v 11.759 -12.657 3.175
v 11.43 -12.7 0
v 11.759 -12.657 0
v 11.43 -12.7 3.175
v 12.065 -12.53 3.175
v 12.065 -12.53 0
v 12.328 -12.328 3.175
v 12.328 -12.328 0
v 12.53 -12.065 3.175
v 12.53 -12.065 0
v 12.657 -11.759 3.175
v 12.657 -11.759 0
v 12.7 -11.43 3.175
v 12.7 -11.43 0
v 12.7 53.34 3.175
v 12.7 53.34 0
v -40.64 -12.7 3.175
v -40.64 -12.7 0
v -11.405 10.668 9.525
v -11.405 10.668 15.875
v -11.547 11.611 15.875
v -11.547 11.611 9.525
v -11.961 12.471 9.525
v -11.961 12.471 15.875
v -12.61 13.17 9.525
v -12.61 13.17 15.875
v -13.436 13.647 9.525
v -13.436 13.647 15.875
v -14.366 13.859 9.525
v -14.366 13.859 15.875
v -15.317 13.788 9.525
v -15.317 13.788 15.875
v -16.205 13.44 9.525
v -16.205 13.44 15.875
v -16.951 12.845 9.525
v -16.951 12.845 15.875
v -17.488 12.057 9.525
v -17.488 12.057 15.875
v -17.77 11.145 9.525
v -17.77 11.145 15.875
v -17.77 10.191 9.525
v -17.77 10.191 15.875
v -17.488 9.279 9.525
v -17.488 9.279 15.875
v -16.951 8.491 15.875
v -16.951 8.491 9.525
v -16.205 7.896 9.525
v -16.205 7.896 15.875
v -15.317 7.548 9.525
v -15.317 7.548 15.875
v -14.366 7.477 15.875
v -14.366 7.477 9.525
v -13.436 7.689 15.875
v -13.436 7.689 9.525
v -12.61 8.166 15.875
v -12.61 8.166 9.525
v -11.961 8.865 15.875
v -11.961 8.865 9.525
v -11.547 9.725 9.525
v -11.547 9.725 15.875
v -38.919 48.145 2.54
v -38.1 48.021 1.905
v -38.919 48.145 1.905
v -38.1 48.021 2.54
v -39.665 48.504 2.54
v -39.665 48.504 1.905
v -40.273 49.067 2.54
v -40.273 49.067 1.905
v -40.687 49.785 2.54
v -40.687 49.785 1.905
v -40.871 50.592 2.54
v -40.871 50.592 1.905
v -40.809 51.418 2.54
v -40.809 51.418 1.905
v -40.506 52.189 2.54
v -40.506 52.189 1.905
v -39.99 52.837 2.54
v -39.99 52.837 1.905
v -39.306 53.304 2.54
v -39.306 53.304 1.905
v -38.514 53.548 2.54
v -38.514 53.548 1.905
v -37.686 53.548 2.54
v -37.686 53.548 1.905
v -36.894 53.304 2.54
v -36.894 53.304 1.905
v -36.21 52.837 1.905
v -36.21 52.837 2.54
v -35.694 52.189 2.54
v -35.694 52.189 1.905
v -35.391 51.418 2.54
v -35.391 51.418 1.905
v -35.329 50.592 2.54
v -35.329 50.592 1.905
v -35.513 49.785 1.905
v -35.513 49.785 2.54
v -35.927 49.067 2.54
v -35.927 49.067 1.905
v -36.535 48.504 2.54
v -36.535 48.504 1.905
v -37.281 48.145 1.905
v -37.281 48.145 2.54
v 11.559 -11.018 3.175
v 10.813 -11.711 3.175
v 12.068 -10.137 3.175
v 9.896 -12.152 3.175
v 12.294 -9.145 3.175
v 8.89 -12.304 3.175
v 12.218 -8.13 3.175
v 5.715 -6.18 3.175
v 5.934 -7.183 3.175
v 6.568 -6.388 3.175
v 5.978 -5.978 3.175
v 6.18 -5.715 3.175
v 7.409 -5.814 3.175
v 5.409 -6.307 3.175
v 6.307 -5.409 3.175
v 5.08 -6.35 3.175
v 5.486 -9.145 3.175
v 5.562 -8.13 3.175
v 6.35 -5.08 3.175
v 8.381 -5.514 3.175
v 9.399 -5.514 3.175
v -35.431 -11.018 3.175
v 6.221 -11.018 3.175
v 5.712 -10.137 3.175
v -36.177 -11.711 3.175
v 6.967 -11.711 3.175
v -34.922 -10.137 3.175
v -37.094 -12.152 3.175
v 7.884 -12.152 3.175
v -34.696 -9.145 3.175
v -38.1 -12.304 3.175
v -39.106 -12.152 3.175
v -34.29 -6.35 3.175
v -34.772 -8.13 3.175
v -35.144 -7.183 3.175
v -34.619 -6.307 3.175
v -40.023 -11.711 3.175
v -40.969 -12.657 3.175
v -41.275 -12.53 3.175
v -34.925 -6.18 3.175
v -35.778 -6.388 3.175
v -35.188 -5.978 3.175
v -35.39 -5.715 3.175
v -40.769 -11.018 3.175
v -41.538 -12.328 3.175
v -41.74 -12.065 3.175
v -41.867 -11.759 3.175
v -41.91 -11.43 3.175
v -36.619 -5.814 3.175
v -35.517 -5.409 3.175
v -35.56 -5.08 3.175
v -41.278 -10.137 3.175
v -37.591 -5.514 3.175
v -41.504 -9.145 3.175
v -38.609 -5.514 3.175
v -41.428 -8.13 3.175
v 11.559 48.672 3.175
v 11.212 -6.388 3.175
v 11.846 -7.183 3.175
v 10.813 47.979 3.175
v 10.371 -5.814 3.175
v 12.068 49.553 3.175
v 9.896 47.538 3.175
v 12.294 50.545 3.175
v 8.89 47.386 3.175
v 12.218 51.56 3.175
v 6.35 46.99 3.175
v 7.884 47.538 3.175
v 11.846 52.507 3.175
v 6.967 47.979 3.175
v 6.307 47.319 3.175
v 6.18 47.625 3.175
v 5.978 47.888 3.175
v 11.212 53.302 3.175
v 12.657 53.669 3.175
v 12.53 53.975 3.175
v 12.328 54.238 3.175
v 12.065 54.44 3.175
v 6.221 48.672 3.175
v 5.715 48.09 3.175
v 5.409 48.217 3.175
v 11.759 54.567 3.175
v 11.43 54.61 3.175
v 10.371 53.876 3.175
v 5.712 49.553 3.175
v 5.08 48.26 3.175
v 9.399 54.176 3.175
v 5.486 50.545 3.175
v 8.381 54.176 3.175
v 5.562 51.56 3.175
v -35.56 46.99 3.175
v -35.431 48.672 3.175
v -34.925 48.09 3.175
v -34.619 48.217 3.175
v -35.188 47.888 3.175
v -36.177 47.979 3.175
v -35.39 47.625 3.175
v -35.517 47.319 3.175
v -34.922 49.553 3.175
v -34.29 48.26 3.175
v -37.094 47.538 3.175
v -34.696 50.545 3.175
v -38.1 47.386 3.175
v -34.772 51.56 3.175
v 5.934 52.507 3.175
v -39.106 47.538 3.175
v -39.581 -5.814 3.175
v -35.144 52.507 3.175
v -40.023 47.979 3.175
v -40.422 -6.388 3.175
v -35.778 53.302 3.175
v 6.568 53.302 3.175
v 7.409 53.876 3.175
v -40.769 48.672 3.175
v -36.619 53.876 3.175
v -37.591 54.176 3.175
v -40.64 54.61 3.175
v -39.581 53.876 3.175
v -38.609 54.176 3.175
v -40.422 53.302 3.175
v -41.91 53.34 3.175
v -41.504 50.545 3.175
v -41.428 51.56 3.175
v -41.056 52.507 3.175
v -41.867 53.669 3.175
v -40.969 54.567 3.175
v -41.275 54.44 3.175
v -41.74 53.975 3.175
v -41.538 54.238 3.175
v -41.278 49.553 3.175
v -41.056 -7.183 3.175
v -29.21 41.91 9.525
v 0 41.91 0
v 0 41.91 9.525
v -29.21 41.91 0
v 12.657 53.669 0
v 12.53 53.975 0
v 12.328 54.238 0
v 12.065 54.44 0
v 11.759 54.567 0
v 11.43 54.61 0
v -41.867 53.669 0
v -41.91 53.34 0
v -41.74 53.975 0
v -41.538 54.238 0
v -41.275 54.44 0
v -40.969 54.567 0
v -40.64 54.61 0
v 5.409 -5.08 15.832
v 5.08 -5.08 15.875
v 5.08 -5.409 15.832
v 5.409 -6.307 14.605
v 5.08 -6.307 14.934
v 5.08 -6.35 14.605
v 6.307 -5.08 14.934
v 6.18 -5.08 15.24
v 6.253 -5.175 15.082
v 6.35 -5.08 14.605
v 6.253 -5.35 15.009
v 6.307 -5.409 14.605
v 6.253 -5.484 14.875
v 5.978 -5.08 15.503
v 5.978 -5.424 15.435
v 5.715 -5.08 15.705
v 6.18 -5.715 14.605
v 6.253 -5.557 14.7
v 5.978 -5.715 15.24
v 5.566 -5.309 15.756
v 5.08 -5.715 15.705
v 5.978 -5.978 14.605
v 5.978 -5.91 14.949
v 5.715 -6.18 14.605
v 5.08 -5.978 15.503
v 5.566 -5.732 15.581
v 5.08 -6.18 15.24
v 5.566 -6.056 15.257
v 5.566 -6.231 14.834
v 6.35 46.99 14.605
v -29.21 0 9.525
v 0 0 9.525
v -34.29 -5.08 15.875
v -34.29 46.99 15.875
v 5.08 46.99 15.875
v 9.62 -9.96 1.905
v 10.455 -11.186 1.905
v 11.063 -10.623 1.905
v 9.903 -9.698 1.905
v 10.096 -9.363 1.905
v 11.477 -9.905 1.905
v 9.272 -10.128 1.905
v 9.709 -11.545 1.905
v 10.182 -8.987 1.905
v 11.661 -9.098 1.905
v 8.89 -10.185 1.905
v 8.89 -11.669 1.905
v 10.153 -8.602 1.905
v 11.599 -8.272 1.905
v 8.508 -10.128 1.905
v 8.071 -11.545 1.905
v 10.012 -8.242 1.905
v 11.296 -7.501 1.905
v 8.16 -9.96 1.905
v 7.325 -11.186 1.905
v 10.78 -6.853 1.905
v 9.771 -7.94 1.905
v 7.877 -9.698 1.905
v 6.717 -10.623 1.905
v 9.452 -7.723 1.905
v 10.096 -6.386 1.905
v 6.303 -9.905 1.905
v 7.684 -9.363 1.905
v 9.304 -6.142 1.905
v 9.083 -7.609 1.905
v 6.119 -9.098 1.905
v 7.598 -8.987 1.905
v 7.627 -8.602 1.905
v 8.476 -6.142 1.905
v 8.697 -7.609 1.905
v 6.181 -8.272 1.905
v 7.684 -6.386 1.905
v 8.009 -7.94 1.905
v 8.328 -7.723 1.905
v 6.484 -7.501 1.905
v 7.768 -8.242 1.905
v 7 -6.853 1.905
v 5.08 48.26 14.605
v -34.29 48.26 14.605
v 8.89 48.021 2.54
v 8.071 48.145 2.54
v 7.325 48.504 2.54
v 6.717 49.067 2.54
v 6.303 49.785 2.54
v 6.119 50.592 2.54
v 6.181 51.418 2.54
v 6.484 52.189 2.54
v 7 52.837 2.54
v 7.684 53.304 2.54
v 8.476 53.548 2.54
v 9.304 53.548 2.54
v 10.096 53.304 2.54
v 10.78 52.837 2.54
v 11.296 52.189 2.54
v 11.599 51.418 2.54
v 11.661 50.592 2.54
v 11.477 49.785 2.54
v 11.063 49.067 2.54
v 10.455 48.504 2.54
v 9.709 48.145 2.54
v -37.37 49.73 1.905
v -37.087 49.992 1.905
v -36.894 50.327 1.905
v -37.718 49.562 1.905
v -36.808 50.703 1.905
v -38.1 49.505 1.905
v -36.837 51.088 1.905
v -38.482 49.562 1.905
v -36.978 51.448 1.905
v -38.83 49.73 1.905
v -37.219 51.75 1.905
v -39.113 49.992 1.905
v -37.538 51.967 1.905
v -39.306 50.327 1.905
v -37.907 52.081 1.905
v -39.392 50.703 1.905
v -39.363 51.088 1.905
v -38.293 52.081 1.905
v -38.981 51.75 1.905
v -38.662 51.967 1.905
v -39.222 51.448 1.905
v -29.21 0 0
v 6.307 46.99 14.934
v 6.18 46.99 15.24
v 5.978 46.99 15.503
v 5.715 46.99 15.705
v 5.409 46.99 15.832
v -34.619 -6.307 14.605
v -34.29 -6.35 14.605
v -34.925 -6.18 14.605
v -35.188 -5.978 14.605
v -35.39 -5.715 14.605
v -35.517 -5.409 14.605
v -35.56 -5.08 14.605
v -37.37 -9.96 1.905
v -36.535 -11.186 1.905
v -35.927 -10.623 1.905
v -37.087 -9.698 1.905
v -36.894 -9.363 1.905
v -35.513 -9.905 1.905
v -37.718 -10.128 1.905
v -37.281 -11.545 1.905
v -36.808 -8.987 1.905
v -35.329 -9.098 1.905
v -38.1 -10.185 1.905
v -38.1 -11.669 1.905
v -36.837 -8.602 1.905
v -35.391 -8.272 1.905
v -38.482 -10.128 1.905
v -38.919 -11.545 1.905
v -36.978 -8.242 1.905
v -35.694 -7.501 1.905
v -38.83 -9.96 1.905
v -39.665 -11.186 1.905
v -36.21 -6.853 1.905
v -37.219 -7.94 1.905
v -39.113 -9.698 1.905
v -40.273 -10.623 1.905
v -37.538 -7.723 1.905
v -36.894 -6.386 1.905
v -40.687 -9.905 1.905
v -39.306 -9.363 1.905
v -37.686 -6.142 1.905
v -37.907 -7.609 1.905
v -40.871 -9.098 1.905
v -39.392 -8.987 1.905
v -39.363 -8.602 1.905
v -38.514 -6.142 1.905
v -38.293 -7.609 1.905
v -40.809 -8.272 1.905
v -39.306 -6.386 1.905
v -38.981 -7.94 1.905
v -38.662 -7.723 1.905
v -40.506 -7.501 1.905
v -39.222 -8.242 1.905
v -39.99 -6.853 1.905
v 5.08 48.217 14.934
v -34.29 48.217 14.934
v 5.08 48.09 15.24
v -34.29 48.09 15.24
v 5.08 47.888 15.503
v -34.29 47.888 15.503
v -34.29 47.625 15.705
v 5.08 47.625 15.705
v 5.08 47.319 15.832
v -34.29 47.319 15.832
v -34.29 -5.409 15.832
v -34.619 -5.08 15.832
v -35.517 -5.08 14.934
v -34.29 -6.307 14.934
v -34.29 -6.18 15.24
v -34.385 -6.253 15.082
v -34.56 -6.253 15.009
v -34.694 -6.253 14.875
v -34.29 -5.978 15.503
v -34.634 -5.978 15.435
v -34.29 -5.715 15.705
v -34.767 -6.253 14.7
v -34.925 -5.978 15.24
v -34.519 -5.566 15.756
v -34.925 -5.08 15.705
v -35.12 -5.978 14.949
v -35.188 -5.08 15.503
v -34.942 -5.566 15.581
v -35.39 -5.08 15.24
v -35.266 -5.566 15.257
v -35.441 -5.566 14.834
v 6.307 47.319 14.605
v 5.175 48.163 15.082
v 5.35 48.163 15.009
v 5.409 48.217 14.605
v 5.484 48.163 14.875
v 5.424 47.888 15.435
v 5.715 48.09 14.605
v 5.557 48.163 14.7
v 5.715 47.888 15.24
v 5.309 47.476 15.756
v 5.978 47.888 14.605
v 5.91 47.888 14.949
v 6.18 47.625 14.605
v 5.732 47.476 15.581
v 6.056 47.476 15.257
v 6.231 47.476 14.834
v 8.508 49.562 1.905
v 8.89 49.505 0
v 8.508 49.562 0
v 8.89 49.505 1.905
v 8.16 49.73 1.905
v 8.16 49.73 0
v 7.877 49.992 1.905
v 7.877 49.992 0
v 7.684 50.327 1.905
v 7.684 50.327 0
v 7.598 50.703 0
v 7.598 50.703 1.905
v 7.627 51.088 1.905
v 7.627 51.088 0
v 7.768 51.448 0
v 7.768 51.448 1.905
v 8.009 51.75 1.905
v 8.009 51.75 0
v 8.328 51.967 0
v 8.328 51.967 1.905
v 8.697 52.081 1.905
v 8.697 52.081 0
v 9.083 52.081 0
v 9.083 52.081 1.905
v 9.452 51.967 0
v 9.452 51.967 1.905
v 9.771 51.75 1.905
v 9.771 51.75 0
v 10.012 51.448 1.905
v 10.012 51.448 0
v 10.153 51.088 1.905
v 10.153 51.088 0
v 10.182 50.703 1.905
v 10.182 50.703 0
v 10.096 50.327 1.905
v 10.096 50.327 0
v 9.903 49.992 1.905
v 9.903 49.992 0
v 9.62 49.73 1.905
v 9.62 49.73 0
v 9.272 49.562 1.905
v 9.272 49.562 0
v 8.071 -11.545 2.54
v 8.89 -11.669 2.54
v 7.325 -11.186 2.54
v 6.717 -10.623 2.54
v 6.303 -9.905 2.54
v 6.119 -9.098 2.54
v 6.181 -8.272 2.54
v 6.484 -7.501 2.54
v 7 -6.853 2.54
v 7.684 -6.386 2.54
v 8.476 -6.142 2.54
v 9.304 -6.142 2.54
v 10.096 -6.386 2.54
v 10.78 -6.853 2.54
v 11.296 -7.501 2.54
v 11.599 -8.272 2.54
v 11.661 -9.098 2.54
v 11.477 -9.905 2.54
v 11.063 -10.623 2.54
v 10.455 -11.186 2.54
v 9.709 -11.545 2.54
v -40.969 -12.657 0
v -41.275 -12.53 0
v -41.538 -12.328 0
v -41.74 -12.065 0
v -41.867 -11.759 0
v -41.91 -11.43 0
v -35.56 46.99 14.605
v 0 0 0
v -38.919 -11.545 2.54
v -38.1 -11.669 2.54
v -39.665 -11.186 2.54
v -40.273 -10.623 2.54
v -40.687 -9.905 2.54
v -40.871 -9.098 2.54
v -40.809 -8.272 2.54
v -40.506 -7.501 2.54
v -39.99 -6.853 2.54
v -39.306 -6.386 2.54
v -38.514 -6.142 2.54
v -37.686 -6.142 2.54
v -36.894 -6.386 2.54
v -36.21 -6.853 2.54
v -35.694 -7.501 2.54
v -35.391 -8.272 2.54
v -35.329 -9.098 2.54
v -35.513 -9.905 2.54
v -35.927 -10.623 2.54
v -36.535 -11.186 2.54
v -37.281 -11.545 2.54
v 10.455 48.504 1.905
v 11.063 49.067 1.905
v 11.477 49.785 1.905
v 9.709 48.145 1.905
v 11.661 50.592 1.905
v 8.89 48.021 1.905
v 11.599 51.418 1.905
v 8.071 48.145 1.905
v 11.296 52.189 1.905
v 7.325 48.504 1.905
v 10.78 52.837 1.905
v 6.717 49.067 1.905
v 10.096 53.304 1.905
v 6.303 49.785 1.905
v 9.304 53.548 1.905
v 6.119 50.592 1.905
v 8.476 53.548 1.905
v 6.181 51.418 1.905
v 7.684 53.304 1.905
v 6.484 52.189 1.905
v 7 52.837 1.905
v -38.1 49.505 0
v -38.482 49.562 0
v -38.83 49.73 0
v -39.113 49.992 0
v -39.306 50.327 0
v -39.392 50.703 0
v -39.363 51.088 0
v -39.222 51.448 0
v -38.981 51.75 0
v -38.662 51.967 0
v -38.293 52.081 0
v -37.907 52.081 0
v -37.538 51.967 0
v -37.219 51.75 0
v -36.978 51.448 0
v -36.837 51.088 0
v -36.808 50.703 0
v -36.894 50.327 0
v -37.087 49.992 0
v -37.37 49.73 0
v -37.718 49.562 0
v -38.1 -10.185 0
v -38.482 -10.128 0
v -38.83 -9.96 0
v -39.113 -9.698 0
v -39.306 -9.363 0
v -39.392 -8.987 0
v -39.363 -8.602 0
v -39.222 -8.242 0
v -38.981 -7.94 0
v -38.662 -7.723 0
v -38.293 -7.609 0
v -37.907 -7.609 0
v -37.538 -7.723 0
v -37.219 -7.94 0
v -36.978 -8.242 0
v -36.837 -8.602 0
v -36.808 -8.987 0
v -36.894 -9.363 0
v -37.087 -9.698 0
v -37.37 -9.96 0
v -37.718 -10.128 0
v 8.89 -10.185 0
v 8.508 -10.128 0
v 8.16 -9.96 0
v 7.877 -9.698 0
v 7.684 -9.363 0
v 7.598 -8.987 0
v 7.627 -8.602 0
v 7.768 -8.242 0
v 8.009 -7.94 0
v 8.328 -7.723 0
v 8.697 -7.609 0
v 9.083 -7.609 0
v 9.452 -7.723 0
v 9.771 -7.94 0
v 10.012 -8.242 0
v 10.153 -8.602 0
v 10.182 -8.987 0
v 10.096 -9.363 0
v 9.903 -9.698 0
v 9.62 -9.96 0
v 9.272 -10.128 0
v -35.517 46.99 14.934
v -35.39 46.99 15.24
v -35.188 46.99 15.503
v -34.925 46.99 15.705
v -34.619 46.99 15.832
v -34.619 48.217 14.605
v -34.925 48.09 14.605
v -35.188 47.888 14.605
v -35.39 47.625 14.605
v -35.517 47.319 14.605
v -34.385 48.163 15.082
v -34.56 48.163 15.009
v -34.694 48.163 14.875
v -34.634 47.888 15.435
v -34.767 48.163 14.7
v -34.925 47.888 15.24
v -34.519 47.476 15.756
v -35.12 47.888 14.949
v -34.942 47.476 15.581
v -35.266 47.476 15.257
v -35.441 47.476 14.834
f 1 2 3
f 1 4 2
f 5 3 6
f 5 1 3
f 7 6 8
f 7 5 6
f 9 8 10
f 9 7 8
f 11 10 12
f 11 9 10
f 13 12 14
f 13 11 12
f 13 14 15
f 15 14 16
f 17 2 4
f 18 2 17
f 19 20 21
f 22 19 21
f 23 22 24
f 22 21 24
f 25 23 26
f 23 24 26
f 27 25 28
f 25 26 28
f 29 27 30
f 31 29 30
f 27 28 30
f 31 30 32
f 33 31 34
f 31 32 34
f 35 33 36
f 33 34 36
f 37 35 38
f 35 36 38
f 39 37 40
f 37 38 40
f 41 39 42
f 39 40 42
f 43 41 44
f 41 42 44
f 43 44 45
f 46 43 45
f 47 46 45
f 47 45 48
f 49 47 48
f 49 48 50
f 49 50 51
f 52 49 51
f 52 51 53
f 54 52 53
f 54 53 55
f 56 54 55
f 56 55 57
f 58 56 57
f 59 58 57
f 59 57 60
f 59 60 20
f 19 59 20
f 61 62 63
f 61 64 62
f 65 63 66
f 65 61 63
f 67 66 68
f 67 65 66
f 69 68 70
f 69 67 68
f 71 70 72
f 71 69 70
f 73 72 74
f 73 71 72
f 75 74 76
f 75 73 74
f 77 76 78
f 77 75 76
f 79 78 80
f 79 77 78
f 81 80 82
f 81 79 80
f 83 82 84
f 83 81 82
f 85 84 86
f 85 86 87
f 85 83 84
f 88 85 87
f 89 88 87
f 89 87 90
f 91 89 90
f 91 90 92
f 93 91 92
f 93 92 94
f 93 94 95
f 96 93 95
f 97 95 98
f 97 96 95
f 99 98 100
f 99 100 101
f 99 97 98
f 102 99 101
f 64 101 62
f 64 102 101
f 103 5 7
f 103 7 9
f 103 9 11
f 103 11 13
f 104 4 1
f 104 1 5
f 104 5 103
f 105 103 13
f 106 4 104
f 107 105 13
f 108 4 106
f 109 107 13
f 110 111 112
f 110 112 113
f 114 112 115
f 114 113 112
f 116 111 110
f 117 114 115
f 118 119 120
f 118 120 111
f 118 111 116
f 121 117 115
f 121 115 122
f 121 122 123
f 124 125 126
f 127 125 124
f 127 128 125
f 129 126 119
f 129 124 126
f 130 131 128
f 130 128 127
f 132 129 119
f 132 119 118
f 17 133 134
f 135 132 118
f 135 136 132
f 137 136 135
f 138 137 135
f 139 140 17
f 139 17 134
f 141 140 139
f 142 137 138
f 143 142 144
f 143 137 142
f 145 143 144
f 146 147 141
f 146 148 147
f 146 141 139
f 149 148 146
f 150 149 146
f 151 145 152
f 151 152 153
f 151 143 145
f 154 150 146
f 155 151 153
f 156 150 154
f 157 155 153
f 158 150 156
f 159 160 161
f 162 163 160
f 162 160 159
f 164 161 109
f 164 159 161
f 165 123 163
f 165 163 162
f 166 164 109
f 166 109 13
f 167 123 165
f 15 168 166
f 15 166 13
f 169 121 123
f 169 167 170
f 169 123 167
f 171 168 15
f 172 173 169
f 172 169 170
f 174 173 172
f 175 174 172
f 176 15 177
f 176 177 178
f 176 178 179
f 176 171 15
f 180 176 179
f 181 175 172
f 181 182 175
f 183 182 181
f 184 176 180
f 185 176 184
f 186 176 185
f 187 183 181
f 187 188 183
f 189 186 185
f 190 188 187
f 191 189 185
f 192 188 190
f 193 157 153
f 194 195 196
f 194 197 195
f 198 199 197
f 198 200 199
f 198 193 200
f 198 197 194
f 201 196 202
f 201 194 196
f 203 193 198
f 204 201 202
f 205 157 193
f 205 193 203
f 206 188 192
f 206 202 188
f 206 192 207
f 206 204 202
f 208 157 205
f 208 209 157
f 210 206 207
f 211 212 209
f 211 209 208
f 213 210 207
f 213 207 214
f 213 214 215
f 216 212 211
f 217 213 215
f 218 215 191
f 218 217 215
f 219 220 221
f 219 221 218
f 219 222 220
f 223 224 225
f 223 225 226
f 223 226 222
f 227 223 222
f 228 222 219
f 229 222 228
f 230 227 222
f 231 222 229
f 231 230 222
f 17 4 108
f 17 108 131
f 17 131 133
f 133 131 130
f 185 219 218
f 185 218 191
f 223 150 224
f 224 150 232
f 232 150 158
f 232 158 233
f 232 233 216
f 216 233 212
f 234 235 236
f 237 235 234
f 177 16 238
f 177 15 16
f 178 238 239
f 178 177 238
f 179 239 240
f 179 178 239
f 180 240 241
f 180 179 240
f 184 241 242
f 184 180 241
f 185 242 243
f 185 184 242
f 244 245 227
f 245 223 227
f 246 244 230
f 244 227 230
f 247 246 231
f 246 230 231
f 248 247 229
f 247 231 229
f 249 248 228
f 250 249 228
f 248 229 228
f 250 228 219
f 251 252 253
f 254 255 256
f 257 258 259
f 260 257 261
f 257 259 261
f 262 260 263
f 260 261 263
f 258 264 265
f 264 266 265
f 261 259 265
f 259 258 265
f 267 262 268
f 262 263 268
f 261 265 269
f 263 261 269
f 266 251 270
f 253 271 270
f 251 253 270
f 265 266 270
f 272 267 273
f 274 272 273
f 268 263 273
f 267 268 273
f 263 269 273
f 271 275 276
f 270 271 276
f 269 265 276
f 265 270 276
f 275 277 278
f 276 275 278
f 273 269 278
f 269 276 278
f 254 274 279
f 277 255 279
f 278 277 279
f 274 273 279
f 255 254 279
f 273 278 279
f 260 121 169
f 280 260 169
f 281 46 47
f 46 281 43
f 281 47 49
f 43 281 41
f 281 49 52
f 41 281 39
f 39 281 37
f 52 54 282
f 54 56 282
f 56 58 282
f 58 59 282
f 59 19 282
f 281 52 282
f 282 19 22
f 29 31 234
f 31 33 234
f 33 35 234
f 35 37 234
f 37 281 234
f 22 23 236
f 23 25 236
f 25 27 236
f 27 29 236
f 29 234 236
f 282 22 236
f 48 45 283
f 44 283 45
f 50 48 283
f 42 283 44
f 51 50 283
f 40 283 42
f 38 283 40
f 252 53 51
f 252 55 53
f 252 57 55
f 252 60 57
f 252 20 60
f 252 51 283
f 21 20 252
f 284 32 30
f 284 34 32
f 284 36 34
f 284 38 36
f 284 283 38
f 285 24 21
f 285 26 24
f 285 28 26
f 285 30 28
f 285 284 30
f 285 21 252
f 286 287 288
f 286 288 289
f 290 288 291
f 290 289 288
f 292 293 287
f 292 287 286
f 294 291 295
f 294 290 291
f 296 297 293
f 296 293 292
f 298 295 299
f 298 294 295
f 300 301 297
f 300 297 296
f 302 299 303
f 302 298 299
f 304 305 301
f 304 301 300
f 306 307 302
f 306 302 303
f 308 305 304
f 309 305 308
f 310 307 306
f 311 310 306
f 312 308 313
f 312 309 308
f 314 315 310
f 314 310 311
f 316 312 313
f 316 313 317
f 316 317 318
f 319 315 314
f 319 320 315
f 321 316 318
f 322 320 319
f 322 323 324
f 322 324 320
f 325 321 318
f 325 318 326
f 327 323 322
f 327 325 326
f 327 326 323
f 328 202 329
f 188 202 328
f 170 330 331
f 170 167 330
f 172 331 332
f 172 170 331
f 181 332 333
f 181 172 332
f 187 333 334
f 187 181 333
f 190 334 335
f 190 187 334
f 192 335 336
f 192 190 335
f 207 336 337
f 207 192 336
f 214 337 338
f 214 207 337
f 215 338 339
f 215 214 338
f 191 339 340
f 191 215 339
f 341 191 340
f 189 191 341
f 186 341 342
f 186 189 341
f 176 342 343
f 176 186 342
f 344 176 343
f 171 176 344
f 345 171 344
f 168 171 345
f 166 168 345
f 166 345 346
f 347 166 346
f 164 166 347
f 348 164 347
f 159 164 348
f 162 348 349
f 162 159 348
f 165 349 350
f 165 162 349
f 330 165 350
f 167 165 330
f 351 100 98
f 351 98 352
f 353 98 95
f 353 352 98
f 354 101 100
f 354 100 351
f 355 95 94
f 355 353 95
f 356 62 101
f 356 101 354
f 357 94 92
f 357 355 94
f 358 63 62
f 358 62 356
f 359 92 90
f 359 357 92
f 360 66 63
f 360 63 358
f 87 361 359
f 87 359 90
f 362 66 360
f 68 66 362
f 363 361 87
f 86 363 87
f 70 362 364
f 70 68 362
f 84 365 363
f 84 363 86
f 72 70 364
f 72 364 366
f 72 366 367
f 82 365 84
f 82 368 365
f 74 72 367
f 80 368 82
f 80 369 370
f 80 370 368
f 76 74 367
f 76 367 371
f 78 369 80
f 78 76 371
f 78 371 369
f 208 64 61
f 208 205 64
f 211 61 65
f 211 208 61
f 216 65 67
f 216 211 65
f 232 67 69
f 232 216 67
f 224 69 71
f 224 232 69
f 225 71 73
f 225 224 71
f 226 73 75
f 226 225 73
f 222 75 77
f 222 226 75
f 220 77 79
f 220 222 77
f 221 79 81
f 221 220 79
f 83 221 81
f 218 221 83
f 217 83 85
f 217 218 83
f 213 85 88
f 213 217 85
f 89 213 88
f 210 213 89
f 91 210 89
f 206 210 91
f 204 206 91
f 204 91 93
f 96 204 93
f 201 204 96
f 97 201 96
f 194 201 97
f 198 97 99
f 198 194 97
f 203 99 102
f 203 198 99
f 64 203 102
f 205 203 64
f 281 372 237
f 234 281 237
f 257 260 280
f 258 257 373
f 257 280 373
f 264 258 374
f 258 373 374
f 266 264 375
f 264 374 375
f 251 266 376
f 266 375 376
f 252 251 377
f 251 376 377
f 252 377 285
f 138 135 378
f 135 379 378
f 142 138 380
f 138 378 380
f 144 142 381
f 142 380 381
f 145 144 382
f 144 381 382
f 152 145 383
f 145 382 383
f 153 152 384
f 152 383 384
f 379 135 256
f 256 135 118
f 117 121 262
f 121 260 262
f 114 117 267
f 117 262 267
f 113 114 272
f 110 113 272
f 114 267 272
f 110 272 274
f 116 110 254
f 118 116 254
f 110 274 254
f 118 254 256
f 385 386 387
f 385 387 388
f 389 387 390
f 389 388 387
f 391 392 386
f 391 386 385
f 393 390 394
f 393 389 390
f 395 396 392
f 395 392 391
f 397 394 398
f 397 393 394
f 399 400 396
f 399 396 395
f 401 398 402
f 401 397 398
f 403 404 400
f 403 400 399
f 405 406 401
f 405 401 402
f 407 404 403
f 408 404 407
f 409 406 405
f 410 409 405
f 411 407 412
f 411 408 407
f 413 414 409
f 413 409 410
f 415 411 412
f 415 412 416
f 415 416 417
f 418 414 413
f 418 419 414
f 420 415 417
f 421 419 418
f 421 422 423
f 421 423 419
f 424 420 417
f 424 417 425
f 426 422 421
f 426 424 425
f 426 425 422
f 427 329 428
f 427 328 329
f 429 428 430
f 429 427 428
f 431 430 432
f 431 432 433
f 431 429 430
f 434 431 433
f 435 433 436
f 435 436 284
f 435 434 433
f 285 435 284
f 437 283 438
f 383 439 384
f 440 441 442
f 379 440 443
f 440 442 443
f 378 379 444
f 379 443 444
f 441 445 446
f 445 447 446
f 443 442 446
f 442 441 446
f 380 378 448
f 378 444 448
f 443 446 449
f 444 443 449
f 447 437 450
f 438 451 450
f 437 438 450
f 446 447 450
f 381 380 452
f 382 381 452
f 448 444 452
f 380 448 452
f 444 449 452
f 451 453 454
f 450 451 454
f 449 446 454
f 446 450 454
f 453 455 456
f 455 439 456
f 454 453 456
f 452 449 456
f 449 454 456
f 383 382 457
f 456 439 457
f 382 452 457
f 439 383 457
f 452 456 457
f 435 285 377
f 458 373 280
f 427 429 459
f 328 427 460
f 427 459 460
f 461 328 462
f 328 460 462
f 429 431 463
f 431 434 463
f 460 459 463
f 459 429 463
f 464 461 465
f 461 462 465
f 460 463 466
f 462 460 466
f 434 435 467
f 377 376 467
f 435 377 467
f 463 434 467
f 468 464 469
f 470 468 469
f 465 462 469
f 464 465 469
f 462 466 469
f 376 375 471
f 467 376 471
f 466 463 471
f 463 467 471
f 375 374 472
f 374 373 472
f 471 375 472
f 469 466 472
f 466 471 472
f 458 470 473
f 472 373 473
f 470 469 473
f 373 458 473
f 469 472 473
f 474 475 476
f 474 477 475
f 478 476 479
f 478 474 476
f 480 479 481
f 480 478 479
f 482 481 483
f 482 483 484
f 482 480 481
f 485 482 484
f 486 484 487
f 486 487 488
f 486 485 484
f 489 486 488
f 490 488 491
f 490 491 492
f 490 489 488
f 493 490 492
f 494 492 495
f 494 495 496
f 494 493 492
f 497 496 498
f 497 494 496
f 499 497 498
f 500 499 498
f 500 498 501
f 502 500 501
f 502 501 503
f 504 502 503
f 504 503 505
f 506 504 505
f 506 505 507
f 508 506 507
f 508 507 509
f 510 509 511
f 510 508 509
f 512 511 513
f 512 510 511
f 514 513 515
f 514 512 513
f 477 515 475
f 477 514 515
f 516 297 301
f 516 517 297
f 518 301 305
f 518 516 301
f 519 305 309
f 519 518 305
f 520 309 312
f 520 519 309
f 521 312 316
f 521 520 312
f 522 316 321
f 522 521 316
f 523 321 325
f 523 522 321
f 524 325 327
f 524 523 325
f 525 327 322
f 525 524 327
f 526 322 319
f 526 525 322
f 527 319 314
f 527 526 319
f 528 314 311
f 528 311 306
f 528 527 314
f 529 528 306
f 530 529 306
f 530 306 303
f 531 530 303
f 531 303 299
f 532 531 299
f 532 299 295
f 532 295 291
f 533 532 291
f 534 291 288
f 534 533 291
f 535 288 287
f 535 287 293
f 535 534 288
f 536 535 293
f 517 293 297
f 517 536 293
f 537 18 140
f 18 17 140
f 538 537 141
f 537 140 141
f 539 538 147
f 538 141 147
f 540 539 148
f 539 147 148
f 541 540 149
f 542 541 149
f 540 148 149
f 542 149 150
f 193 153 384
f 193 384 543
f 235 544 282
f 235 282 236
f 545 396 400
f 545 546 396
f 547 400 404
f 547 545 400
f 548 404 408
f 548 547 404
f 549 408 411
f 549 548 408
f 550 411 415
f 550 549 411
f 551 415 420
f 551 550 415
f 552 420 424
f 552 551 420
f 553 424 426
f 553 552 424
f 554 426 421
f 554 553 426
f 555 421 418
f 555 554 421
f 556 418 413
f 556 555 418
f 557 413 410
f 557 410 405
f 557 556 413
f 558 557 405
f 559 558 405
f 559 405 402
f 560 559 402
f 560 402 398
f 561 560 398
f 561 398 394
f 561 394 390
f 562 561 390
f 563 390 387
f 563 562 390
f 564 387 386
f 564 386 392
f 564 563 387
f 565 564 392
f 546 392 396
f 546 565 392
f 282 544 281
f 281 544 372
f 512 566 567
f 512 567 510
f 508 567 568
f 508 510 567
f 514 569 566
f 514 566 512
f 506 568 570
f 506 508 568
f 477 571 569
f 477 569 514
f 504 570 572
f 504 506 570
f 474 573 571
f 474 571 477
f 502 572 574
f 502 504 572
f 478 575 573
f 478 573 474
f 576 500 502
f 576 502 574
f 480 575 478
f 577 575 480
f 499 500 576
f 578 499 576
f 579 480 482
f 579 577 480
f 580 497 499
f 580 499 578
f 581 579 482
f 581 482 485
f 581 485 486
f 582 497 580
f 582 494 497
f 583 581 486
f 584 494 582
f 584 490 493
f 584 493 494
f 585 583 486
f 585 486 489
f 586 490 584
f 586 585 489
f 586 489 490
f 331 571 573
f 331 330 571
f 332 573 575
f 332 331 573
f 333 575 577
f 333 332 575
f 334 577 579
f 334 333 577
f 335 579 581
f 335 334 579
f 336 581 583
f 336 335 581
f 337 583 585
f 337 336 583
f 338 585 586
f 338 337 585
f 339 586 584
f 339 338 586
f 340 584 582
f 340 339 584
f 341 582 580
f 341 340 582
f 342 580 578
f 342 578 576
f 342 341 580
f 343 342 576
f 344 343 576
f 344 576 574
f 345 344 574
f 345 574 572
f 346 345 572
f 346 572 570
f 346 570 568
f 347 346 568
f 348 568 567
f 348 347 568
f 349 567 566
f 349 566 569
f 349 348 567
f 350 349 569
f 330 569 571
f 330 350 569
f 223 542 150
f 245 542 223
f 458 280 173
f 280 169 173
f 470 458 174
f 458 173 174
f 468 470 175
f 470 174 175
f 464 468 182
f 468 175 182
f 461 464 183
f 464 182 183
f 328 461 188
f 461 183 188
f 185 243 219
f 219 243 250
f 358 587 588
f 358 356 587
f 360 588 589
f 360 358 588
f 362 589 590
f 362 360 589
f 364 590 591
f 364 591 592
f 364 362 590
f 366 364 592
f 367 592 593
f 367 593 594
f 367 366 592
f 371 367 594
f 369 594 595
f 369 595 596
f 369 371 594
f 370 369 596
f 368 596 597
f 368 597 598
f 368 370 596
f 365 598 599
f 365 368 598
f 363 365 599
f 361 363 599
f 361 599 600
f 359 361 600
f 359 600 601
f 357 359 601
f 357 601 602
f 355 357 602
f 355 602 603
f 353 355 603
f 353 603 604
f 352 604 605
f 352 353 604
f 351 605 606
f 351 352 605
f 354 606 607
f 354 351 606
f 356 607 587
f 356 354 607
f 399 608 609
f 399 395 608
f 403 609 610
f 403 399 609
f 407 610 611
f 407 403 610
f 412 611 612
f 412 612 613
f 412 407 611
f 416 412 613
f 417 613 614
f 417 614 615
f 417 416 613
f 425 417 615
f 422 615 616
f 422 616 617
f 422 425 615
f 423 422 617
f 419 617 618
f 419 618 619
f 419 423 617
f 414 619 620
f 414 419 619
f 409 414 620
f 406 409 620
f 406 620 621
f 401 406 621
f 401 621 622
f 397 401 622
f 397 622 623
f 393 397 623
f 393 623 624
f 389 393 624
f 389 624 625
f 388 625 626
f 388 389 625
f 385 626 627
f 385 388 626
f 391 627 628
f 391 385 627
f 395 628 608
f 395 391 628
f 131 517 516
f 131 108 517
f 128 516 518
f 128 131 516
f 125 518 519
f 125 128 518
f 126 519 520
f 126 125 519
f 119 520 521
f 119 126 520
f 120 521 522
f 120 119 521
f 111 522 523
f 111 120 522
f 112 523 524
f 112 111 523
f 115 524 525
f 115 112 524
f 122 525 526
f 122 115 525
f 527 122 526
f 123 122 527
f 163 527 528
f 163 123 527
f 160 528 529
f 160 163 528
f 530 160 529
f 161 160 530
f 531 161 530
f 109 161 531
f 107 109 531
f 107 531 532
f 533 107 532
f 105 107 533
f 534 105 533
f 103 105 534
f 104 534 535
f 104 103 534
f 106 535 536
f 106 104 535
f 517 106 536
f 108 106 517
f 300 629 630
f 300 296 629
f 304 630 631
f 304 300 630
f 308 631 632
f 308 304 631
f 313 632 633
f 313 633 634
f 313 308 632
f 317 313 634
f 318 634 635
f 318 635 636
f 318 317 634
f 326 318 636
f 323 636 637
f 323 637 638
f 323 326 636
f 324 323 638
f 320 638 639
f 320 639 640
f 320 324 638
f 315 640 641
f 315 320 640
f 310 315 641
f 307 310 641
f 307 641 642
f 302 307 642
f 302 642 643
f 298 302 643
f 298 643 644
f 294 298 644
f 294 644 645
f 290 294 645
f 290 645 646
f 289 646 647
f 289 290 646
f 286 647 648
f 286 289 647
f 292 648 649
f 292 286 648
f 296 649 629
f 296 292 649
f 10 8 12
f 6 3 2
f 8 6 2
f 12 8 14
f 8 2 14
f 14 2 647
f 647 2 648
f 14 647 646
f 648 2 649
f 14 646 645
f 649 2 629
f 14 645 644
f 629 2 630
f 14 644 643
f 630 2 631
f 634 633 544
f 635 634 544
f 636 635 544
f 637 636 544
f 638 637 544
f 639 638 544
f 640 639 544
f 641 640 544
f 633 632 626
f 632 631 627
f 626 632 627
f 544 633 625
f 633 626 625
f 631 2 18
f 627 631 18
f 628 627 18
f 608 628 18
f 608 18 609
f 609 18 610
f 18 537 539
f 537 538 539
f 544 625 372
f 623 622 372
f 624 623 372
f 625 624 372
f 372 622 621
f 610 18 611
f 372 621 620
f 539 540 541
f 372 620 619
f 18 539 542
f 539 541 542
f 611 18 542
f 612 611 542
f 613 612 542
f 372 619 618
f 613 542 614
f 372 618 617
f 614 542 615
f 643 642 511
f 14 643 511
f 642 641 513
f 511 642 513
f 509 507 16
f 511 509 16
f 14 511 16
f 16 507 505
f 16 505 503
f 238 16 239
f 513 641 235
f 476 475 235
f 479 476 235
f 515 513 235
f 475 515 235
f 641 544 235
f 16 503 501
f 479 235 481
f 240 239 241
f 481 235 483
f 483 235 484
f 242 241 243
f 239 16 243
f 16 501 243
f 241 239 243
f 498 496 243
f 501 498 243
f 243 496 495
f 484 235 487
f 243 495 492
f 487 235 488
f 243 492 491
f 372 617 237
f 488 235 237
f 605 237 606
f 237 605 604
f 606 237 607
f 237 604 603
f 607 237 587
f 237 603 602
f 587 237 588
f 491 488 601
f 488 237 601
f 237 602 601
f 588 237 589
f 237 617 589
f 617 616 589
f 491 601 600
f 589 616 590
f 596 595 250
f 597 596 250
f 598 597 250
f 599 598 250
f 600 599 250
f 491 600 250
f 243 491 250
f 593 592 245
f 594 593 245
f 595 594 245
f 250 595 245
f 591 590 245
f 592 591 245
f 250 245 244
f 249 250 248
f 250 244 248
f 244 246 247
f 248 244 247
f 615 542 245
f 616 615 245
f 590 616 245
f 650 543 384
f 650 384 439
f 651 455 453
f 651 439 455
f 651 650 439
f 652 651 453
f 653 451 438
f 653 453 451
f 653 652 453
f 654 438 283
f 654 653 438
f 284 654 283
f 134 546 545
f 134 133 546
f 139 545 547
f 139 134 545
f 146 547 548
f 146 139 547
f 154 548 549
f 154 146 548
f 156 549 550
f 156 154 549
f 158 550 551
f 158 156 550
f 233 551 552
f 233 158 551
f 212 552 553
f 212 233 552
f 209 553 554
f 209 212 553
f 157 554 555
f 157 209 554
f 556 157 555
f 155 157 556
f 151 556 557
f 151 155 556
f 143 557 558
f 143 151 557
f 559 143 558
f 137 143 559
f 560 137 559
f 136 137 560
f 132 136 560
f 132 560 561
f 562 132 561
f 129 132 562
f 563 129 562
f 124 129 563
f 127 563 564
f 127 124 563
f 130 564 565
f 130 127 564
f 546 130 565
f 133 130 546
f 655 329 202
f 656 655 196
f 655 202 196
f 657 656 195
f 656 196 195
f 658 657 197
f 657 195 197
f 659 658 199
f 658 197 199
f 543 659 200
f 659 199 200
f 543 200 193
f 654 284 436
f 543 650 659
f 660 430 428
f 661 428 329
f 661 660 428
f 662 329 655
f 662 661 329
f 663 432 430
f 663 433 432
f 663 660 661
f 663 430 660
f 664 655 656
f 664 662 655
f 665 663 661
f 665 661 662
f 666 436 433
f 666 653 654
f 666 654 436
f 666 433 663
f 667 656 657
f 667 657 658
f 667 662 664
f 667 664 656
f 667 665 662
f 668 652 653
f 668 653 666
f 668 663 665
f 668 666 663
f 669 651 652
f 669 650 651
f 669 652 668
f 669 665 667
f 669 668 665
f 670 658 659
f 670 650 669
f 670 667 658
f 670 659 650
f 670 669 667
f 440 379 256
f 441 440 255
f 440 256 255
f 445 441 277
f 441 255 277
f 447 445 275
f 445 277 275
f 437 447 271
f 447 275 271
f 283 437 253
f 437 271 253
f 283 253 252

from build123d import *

# Parameters (mm, degrees)
SKETCH2_W                                   = 54.61
SKETCH2_H                                   = 41.91
SKETCH2_W_2                                 = 41.91
SKETCH2_H_2                                 = 29.21
BOSS_EXTRUDE1_DEPTH                         = 9.525
SKETCH4_W                                   = 41.91
SKETCH4_H                                   = 54.61
BOSS_EXTRUDE2_DEPTH                         = 6.35
SKETCH6_R                                   = 3.2004
CUT_EXTRUDE1_DEPTH                          = 63.012553769
SKETCH7_W                                   = 67.31
SKETCH7_H                                   = 54.61
SKETCH7_W_2                                 = 54.61
SKETCH7_H_2                                 = 41.91
BOSS_EXTRUDE3_DEPTH                         = 3.175
CBORE_FOR_2_BINDING_HEAD_MACHINE_SC_2_COUNT = 2
CBORE_FOR_2_BINDING_HEAD_MACHINE_SC_2_PITCH = 46.99
CBORE_FOR_2_BINDING_HEAD_MACHINE_SC_3_COUNT = 2
CBORE_FOR_2_BINDING_HEAD_MACHINE_SC_3_PITCH = 75.966809858
CBORE_FOR_2_BINDING_HEAD_MACHINE_SC_4_COUNT = 2
CBORE_FOR_2_BINDING_HEAD_MACHINE_SC_4_PITCH = 59.69
FILLET1_R                                   = 1.27


with BuildPart() as part:
    # Sketch2 → Boss-Extrude1 (new body)
    with BuildSketch(Plane(origin=(0, 0, 0), x_dir=(0, 1, 0), z_dir=(0, 0, 1))):
        with Locations((20.955, 14.605)):
            Rectangle(SKETCH2_W, SKETCH2_H)
        with Locations((20.955, 14.605)):
            Rectangle(SKETCH2_W_2, SKETCH2_H_2, mode=Mode.SUBTRACT)
    extrude(amount=BOSS_EXTRUDE1_DEPTH)

    # Sketch4 → Boss-Extrude2 (add)
    with BuildSketch(Plane.XY.offset(9.525)):
        with Locations((-14.605, 20.955)):
            Rectangle(SKETCH4_W, SKETCH4_H)
    extrude(amount=BOSS_EXTRUDE2_DEPTH)

    # Sketch6 → Cut-Extrude1 (cut, through all)
    with BuildSketch(Plane.XY.offset(15.875)):
        with Locations((-14.605, 10.668)):
            Circle(SKETCH6_R)
    extrude(amount=-CUT_EXTRUDE1_DEPTH, mode=Mode.SUBTRACT)

    # Sketch7 → Boss-Extrude3 (add)
    with BuildSketch(Plane(origin=(0, 0, 0), x_dir=(0, 1, 0), z_dir=(0, 0, 1))):
        with Locations((20.955, 14.605)):
            Rectangle(SKETCH7_W, SKETCH7_H)
        with Locations((20.955, 14.605)):
            Rectangle(SKETCH7_W_2, SKETCH7_H_2, mode=Mode.SUBTRACT)
    extrude(amount=BOSS_EXTRUDE3_DEPTH)

    # Sketch9 → CBORE for #2 Binding Head Machine Screw1 (revolve, cut)
    with BuildSketch(Plane(origin=(-38.1, 50.8, 3.175), x_dir=(0, -1, 0), z_dir=(1, 0, 0))):
        Polygon((0, 0), (0, 3.175), (1.2954, 3.175), (1.2954, 1.27), (2.77876, 1.27), (2.77876, 0.635), (3.41376, 0), align=None)
    cbore_for_2_binding_head_machine_screw1 = revolve(axis=Axis((-38.1, 50.8, 9.525), (0, 0, -1)), mode=Mode.SUBTRACT)

    # CBORE for _2 Binding Head Machine Sc 2: CBORE for #2 Binding Head Machine Screw1 ×2
    with Locations(*[(i * CBORE_FOR_2_BINDING_HEAD_MACHINE_SC_2_PITCH, 0, 0) for i in range(1, CBORE_FOR_2_BINDING_HEAD_MACHINE_SC_2_COUNT)]):
        add(cbore_for_2_binding_head_machine_screw1, mode=Mode.SUBTRACT)

    # CBORE for _2 Binding Head Machine Sc 3: CBORE for #2 Binding Head Machine Screw1 ×2
    with Locations(*[Vector(0.6185596063312605, -0.7857378783126826, 0) * (i * CBORE_FOR_2_BINDING_HEAD_MACHINE_SC_3_PITCH) for i in range(1, CBORE_FOR_2_BINDING_HEAD_MACHINE_SC_3_COUNT)]):
        add(cbore_for_2_binding_head_machine_screw1, mode=Mode.SUBTRACT)

    # CBORE for _2 Binding Head Machine Sc 4: CBORE for #2 Binding Head Machine Screw1 ×2
    with Locations(*[(0, -i * CBORE_FOR_2_BINDING_HEAD_MACHINE_SC_4_PITCH, 0) for i in range(1, CBORE_FOR_2_BINDING_HEAD_MACHINE_SC_4_COUNT)]):
        add(cbore_for_2_binding_head_machine_screw1, mode=Mode.SUBTRACT)

    # Fillet1
    fillet1_edges = [part.edges().sort_by_distance(p)[0] for p in [
        (-35.56, 20.955, 15.875),
        (-14.605, -6.35, 15.875),
        (6.35, 20.955, 15.875),
        (-14.605, 48.26, 15.875),
        (-41.91, -12.7, 1.5875),
        (12.7, -12.7, 1.5875),
        (12.7, 54.61, 1.5875),
        (-41.91, 54.61, 1.5875),
        (-35.56, -6.35, 9.525),
        (-35.56, 48.26, 9.525),
        (6.35, 48.26, 9.525),
        (6.35, -6.35, 9.525),
    ]]
    fillet(fillet1_edges, radius=FILLET1_R)


solid = part.part
